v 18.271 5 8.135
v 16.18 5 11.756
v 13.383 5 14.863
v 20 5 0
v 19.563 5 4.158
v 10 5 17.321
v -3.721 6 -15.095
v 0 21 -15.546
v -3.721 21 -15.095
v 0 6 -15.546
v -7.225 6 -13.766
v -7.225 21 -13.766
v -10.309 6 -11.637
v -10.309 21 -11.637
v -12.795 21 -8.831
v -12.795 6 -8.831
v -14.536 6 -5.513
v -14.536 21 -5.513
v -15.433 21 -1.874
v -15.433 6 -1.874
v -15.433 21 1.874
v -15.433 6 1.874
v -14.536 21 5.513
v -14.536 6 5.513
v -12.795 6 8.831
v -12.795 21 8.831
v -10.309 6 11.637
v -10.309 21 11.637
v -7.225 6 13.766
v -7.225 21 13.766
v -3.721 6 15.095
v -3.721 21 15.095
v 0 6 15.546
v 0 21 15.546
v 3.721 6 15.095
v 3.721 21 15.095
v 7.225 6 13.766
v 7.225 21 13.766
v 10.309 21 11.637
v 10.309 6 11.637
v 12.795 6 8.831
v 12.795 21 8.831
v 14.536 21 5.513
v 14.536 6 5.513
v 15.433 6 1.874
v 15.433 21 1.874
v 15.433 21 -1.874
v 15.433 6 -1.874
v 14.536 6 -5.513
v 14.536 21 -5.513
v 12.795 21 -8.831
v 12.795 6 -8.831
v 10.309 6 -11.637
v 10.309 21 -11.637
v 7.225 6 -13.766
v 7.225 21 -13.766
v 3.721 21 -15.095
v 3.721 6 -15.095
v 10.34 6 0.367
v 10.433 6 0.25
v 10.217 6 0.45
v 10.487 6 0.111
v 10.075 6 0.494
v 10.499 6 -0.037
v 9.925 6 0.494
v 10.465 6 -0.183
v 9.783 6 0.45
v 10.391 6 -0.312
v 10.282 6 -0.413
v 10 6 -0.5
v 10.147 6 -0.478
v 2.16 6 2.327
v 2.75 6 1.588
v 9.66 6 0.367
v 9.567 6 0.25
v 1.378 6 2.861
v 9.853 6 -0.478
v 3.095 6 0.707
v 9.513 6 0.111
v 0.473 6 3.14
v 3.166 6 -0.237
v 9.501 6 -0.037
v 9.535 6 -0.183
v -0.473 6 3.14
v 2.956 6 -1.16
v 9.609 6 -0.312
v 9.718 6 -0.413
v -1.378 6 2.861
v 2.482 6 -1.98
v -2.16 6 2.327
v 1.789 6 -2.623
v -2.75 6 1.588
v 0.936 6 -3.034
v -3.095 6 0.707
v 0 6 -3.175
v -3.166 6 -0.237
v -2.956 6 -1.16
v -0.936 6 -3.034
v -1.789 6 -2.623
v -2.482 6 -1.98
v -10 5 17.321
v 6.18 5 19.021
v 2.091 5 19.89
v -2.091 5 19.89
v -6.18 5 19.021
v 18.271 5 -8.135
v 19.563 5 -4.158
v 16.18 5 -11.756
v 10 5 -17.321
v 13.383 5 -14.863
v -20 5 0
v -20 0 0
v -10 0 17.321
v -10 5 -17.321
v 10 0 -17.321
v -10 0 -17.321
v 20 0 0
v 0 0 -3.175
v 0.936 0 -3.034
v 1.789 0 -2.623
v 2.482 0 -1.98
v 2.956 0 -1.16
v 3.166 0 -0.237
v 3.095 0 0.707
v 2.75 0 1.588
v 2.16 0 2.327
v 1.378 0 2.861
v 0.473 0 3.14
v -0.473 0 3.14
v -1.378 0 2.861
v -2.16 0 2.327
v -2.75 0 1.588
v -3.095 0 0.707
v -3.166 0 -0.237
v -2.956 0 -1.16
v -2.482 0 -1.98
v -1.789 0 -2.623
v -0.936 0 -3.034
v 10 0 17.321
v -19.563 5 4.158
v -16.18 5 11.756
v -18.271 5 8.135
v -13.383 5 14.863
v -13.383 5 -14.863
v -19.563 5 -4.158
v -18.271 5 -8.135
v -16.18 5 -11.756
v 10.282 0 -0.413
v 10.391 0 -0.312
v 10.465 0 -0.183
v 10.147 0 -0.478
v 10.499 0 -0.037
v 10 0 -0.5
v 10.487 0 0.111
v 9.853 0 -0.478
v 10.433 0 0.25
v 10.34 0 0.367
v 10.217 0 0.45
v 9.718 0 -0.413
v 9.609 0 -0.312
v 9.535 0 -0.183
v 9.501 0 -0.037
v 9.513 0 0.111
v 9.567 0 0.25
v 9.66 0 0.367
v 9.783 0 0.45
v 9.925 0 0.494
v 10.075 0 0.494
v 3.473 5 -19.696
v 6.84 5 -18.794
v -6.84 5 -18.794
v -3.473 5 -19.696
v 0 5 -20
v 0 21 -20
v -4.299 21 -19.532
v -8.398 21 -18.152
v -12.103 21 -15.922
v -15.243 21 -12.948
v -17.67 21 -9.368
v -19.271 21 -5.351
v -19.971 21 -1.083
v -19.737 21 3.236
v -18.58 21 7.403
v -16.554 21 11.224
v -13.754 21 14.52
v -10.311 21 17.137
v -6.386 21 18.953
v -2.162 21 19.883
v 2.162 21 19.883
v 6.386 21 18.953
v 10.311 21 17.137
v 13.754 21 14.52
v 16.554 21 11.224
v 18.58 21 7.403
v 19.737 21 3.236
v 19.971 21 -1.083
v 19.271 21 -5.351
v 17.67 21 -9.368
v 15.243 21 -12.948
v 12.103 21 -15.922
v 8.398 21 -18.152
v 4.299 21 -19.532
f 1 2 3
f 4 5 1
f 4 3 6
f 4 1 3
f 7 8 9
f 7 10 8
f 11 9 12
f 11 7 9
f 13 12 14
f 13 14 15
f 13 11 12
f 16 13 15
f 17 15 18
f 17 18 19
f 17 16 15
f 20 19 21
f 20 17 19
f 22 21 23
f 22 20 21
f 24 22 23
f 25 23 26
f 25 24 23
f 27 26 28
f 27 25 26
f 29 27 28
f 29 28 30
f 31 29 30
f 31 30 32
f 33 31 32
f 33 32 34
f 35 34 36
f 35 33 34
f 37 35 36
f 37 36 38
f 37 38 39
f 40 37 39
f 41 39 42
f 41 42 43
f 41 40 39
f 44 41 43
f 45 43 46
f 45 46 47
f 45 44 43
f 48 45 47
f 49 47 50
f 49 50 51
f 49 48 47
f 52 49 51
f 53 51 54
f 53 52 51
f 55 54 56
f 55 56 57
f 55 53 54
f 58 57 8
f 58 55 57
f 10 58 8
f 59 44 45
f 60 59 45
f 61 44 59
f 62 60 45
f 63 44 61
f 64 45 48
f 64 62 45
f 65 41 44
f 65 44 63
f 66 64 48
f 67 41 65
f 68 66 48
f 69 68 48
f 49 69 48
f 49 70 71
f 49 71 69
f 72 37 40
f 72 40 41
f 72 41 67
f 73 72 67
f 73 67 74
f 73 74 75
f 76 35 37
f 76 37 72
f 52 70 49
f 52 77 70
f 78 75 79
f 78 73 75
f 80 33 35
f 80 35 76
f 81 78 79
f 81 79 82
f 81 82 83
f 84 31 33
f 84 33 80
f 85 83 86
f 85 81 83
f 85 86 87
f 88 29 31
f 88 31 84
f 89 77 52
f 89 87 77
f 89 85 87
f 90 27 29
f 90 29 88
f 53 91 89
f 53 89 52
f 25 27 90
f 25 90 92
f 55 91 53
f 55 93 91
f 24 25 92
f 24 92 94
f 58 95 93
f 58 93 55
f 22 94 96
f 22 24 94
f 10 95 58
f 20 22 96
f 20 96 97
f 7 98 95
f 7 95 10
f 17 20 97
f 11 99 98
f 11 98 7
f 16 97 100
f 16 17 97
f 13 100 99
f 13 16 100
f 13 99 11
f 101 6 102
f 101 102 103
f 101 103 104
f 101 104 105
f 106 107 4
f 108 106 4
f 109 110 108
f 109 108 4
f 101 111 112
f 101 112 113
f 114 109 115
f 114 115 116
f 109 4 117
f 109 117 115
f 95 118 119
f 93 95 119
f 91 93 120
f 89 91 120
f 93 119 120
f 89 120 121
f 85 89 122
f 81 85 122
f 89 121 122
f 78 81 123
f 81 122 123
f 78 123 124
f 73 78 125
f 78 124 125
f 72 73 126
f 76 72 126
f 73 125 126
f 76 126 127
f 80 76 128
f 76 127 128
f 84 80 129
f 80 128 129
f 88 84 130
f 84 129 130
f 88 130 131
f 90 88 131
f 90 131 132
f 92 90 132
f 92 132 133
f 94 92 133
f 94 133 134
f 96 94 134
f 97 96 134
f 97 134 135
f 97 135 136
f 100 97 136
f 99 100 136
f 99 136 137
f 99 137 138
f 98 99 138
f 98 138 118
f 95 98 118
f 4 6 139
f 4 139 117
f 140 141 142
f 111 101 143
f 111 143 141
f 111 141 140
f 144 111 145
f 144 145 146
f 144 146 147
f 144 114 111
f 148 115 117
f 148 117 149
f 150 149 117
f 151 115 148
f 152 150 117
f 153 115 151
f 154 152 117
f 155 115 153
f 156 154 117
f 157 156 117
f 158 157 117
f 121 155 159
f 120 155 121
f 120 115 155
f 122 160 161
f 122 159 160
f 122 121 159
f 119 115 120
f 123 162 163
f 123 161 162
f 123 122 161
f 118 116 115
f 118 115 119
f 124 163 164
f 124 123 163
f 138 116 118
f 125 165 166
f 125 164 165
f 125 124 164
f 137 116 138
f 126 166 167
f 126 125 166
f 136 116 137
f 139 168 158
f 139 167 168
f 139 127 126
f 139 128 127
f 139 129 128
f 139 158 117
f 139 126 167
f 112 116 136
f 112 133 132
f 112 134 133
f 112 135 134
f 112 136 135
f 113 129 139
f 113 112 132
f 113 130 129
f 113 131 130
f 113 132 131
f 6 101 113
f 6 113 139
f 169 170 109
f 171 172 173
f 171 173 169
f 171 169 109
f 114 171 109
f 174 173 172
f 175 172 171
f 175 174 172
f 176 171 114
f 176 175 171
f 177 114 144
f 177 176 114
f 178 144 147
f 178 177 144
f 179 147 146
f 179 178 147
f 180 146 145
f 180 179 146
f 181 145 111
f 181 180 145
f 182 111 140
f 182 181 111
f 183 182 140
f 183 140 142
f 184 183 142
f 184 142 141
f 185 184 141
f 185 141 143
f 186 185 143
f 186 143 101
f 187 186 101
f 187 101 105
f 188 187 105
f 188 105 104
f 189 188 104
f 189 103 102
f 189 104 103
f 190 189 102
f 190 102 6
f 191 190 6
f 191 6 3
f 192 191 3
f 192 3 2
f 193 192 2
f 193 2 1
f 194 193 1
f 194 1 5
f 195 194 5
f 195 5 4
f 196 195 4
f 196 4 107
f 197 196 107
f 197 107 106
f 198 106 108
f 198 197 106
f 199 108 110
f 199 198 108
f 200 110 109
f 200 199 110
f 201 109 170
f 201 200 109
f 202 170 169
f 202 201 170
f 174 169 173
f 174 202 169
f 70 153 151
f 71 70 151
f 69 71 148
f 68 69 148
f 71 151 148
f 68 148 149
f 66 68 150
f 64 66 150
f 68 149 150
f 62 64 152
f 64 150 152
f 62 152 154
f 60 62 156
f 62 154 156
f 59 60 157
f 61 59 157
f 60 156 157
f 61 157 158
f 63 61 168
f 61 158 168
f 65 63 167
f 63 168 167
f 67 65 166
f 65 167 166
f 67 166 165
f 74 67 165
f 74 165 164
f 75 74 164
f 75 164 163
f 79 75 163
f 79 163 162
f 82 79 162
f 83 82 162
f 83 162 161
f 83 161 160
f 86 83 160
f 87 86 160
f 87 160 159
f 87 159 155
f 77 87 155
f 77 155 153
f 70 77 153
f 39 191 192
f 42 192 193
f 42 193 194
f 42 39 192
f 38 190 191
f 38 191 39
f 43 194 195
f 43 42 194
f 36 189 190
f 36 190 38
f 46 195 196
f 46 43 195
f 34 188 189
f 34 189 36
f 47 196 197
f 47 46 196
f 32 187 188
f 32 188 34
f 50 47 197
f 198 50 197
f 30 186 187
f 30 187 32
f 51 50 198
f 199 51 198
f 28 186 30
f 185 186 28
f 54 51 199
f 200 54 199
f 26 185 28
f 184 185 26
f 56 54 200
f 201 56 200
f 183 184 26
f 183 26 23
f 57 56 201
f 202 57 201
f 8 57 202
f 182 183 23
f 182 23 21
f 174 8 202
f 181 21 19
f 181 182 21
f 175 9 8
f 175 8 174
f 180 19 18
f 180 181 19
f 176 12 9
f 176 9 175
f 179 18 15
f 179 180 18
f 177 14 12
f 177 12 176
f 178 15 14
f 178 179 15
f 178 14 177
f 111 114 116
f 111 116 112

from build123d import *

# Parameters (mm, degrees)
SCHIZZO2_R               = 3.175
SCHIZZO2_R_2             = 0.5
TAGLIO_ESTRUSIONE1_DEPTH = 10
TAGLIO_ESTRUSIONE2_START = -5
TAGLIO_ESTRUSIONE2_DEPTH = 5


with BuildPart() as part:
    # Schizzo1 → Rivoluzione1 (revolve)
    with BuildSketch(Plane.XY, mode=Mode.PRIVATE) as rivoluzione1_sk:
        Polygon((0, 0), (-20, 0), (-20, 21), (-15.5465, 21), (-15.5465, 6), (0, 6), align=None)
    revolve(rivoluzione1_sk.sketch.rotate(Axis((0, 0, 0), (0, 1, 0)), 270), axis=Axis((0, 0, 0), (0, 1, 0)))

    # Schizzo2 → Taglio-Estrusione1 (cut)
    with BuildSketch(Plane.XZ):
        with Locations(Location((0, 0, 0), (0, 0, 270))):
            Circle(SCHIZZO2_R)
        with Locations(Location((10, 0, 0), (0, 0, 270))):
            Circle(SCHIZZO2_R_2)
    extrude(amount=-TAGLIO_ESTRUSIONE1_DEPTH, mode=Mode.SUBTRACT)

    # Schizzo5 → Taglio-Estrusione2 (cut)
    with BuildSketch(Plane(origin=(0, 0, 0), x_dir=(-1, 0, 0), z_dir=(0, -1, 0)).offset(TAGLIO_ESTRUSIONE2_START)):
        with BuildLine():
            Line((-10, 17.320508076), (10, 17.320508076))
            ThreePointArc((10, 17.320508076), (0, 20), (-10, 17.320508076))
        make_face()
        with BuildLine():
            ThreePointArc((20, 0), (17.320508076, 10), (10, 17.320508076))
            Line((10, 17.320508076), (20, 0))
        make_face()
        with BuildLine():
            ThreePointArc((10, -17.320508076), (17.320508076, -10), (20, 0))
            Line((20, 0), (10, -17.320508076))
        make_face()
        with BuildLine():
            ThreePointArc((-10, -17.320508076), (0, -20), (10, -17.320508076))
            Line((10, -17.320508076), (-10, -17.320508076))
        make_face()
        with BuildLine():
            Line((-10, -17.320508076), (-20, 0))
            ThreePointArc((-20, 0), (-17.320508076, -10), (-10, -17.320508076))
        make_face()
        with BuildLine():
            Line((-20, 0), (-10, 17.320508076))
            ThreePointArc((-10, 17.320508076), (-17.320508076, 10), (-20, 0))
        make_face()
    extrude(amount=TAGLIO_ESTRUSIONE2_DEPTH, mode=Mode.SUBTRACT)


solid = part.part
